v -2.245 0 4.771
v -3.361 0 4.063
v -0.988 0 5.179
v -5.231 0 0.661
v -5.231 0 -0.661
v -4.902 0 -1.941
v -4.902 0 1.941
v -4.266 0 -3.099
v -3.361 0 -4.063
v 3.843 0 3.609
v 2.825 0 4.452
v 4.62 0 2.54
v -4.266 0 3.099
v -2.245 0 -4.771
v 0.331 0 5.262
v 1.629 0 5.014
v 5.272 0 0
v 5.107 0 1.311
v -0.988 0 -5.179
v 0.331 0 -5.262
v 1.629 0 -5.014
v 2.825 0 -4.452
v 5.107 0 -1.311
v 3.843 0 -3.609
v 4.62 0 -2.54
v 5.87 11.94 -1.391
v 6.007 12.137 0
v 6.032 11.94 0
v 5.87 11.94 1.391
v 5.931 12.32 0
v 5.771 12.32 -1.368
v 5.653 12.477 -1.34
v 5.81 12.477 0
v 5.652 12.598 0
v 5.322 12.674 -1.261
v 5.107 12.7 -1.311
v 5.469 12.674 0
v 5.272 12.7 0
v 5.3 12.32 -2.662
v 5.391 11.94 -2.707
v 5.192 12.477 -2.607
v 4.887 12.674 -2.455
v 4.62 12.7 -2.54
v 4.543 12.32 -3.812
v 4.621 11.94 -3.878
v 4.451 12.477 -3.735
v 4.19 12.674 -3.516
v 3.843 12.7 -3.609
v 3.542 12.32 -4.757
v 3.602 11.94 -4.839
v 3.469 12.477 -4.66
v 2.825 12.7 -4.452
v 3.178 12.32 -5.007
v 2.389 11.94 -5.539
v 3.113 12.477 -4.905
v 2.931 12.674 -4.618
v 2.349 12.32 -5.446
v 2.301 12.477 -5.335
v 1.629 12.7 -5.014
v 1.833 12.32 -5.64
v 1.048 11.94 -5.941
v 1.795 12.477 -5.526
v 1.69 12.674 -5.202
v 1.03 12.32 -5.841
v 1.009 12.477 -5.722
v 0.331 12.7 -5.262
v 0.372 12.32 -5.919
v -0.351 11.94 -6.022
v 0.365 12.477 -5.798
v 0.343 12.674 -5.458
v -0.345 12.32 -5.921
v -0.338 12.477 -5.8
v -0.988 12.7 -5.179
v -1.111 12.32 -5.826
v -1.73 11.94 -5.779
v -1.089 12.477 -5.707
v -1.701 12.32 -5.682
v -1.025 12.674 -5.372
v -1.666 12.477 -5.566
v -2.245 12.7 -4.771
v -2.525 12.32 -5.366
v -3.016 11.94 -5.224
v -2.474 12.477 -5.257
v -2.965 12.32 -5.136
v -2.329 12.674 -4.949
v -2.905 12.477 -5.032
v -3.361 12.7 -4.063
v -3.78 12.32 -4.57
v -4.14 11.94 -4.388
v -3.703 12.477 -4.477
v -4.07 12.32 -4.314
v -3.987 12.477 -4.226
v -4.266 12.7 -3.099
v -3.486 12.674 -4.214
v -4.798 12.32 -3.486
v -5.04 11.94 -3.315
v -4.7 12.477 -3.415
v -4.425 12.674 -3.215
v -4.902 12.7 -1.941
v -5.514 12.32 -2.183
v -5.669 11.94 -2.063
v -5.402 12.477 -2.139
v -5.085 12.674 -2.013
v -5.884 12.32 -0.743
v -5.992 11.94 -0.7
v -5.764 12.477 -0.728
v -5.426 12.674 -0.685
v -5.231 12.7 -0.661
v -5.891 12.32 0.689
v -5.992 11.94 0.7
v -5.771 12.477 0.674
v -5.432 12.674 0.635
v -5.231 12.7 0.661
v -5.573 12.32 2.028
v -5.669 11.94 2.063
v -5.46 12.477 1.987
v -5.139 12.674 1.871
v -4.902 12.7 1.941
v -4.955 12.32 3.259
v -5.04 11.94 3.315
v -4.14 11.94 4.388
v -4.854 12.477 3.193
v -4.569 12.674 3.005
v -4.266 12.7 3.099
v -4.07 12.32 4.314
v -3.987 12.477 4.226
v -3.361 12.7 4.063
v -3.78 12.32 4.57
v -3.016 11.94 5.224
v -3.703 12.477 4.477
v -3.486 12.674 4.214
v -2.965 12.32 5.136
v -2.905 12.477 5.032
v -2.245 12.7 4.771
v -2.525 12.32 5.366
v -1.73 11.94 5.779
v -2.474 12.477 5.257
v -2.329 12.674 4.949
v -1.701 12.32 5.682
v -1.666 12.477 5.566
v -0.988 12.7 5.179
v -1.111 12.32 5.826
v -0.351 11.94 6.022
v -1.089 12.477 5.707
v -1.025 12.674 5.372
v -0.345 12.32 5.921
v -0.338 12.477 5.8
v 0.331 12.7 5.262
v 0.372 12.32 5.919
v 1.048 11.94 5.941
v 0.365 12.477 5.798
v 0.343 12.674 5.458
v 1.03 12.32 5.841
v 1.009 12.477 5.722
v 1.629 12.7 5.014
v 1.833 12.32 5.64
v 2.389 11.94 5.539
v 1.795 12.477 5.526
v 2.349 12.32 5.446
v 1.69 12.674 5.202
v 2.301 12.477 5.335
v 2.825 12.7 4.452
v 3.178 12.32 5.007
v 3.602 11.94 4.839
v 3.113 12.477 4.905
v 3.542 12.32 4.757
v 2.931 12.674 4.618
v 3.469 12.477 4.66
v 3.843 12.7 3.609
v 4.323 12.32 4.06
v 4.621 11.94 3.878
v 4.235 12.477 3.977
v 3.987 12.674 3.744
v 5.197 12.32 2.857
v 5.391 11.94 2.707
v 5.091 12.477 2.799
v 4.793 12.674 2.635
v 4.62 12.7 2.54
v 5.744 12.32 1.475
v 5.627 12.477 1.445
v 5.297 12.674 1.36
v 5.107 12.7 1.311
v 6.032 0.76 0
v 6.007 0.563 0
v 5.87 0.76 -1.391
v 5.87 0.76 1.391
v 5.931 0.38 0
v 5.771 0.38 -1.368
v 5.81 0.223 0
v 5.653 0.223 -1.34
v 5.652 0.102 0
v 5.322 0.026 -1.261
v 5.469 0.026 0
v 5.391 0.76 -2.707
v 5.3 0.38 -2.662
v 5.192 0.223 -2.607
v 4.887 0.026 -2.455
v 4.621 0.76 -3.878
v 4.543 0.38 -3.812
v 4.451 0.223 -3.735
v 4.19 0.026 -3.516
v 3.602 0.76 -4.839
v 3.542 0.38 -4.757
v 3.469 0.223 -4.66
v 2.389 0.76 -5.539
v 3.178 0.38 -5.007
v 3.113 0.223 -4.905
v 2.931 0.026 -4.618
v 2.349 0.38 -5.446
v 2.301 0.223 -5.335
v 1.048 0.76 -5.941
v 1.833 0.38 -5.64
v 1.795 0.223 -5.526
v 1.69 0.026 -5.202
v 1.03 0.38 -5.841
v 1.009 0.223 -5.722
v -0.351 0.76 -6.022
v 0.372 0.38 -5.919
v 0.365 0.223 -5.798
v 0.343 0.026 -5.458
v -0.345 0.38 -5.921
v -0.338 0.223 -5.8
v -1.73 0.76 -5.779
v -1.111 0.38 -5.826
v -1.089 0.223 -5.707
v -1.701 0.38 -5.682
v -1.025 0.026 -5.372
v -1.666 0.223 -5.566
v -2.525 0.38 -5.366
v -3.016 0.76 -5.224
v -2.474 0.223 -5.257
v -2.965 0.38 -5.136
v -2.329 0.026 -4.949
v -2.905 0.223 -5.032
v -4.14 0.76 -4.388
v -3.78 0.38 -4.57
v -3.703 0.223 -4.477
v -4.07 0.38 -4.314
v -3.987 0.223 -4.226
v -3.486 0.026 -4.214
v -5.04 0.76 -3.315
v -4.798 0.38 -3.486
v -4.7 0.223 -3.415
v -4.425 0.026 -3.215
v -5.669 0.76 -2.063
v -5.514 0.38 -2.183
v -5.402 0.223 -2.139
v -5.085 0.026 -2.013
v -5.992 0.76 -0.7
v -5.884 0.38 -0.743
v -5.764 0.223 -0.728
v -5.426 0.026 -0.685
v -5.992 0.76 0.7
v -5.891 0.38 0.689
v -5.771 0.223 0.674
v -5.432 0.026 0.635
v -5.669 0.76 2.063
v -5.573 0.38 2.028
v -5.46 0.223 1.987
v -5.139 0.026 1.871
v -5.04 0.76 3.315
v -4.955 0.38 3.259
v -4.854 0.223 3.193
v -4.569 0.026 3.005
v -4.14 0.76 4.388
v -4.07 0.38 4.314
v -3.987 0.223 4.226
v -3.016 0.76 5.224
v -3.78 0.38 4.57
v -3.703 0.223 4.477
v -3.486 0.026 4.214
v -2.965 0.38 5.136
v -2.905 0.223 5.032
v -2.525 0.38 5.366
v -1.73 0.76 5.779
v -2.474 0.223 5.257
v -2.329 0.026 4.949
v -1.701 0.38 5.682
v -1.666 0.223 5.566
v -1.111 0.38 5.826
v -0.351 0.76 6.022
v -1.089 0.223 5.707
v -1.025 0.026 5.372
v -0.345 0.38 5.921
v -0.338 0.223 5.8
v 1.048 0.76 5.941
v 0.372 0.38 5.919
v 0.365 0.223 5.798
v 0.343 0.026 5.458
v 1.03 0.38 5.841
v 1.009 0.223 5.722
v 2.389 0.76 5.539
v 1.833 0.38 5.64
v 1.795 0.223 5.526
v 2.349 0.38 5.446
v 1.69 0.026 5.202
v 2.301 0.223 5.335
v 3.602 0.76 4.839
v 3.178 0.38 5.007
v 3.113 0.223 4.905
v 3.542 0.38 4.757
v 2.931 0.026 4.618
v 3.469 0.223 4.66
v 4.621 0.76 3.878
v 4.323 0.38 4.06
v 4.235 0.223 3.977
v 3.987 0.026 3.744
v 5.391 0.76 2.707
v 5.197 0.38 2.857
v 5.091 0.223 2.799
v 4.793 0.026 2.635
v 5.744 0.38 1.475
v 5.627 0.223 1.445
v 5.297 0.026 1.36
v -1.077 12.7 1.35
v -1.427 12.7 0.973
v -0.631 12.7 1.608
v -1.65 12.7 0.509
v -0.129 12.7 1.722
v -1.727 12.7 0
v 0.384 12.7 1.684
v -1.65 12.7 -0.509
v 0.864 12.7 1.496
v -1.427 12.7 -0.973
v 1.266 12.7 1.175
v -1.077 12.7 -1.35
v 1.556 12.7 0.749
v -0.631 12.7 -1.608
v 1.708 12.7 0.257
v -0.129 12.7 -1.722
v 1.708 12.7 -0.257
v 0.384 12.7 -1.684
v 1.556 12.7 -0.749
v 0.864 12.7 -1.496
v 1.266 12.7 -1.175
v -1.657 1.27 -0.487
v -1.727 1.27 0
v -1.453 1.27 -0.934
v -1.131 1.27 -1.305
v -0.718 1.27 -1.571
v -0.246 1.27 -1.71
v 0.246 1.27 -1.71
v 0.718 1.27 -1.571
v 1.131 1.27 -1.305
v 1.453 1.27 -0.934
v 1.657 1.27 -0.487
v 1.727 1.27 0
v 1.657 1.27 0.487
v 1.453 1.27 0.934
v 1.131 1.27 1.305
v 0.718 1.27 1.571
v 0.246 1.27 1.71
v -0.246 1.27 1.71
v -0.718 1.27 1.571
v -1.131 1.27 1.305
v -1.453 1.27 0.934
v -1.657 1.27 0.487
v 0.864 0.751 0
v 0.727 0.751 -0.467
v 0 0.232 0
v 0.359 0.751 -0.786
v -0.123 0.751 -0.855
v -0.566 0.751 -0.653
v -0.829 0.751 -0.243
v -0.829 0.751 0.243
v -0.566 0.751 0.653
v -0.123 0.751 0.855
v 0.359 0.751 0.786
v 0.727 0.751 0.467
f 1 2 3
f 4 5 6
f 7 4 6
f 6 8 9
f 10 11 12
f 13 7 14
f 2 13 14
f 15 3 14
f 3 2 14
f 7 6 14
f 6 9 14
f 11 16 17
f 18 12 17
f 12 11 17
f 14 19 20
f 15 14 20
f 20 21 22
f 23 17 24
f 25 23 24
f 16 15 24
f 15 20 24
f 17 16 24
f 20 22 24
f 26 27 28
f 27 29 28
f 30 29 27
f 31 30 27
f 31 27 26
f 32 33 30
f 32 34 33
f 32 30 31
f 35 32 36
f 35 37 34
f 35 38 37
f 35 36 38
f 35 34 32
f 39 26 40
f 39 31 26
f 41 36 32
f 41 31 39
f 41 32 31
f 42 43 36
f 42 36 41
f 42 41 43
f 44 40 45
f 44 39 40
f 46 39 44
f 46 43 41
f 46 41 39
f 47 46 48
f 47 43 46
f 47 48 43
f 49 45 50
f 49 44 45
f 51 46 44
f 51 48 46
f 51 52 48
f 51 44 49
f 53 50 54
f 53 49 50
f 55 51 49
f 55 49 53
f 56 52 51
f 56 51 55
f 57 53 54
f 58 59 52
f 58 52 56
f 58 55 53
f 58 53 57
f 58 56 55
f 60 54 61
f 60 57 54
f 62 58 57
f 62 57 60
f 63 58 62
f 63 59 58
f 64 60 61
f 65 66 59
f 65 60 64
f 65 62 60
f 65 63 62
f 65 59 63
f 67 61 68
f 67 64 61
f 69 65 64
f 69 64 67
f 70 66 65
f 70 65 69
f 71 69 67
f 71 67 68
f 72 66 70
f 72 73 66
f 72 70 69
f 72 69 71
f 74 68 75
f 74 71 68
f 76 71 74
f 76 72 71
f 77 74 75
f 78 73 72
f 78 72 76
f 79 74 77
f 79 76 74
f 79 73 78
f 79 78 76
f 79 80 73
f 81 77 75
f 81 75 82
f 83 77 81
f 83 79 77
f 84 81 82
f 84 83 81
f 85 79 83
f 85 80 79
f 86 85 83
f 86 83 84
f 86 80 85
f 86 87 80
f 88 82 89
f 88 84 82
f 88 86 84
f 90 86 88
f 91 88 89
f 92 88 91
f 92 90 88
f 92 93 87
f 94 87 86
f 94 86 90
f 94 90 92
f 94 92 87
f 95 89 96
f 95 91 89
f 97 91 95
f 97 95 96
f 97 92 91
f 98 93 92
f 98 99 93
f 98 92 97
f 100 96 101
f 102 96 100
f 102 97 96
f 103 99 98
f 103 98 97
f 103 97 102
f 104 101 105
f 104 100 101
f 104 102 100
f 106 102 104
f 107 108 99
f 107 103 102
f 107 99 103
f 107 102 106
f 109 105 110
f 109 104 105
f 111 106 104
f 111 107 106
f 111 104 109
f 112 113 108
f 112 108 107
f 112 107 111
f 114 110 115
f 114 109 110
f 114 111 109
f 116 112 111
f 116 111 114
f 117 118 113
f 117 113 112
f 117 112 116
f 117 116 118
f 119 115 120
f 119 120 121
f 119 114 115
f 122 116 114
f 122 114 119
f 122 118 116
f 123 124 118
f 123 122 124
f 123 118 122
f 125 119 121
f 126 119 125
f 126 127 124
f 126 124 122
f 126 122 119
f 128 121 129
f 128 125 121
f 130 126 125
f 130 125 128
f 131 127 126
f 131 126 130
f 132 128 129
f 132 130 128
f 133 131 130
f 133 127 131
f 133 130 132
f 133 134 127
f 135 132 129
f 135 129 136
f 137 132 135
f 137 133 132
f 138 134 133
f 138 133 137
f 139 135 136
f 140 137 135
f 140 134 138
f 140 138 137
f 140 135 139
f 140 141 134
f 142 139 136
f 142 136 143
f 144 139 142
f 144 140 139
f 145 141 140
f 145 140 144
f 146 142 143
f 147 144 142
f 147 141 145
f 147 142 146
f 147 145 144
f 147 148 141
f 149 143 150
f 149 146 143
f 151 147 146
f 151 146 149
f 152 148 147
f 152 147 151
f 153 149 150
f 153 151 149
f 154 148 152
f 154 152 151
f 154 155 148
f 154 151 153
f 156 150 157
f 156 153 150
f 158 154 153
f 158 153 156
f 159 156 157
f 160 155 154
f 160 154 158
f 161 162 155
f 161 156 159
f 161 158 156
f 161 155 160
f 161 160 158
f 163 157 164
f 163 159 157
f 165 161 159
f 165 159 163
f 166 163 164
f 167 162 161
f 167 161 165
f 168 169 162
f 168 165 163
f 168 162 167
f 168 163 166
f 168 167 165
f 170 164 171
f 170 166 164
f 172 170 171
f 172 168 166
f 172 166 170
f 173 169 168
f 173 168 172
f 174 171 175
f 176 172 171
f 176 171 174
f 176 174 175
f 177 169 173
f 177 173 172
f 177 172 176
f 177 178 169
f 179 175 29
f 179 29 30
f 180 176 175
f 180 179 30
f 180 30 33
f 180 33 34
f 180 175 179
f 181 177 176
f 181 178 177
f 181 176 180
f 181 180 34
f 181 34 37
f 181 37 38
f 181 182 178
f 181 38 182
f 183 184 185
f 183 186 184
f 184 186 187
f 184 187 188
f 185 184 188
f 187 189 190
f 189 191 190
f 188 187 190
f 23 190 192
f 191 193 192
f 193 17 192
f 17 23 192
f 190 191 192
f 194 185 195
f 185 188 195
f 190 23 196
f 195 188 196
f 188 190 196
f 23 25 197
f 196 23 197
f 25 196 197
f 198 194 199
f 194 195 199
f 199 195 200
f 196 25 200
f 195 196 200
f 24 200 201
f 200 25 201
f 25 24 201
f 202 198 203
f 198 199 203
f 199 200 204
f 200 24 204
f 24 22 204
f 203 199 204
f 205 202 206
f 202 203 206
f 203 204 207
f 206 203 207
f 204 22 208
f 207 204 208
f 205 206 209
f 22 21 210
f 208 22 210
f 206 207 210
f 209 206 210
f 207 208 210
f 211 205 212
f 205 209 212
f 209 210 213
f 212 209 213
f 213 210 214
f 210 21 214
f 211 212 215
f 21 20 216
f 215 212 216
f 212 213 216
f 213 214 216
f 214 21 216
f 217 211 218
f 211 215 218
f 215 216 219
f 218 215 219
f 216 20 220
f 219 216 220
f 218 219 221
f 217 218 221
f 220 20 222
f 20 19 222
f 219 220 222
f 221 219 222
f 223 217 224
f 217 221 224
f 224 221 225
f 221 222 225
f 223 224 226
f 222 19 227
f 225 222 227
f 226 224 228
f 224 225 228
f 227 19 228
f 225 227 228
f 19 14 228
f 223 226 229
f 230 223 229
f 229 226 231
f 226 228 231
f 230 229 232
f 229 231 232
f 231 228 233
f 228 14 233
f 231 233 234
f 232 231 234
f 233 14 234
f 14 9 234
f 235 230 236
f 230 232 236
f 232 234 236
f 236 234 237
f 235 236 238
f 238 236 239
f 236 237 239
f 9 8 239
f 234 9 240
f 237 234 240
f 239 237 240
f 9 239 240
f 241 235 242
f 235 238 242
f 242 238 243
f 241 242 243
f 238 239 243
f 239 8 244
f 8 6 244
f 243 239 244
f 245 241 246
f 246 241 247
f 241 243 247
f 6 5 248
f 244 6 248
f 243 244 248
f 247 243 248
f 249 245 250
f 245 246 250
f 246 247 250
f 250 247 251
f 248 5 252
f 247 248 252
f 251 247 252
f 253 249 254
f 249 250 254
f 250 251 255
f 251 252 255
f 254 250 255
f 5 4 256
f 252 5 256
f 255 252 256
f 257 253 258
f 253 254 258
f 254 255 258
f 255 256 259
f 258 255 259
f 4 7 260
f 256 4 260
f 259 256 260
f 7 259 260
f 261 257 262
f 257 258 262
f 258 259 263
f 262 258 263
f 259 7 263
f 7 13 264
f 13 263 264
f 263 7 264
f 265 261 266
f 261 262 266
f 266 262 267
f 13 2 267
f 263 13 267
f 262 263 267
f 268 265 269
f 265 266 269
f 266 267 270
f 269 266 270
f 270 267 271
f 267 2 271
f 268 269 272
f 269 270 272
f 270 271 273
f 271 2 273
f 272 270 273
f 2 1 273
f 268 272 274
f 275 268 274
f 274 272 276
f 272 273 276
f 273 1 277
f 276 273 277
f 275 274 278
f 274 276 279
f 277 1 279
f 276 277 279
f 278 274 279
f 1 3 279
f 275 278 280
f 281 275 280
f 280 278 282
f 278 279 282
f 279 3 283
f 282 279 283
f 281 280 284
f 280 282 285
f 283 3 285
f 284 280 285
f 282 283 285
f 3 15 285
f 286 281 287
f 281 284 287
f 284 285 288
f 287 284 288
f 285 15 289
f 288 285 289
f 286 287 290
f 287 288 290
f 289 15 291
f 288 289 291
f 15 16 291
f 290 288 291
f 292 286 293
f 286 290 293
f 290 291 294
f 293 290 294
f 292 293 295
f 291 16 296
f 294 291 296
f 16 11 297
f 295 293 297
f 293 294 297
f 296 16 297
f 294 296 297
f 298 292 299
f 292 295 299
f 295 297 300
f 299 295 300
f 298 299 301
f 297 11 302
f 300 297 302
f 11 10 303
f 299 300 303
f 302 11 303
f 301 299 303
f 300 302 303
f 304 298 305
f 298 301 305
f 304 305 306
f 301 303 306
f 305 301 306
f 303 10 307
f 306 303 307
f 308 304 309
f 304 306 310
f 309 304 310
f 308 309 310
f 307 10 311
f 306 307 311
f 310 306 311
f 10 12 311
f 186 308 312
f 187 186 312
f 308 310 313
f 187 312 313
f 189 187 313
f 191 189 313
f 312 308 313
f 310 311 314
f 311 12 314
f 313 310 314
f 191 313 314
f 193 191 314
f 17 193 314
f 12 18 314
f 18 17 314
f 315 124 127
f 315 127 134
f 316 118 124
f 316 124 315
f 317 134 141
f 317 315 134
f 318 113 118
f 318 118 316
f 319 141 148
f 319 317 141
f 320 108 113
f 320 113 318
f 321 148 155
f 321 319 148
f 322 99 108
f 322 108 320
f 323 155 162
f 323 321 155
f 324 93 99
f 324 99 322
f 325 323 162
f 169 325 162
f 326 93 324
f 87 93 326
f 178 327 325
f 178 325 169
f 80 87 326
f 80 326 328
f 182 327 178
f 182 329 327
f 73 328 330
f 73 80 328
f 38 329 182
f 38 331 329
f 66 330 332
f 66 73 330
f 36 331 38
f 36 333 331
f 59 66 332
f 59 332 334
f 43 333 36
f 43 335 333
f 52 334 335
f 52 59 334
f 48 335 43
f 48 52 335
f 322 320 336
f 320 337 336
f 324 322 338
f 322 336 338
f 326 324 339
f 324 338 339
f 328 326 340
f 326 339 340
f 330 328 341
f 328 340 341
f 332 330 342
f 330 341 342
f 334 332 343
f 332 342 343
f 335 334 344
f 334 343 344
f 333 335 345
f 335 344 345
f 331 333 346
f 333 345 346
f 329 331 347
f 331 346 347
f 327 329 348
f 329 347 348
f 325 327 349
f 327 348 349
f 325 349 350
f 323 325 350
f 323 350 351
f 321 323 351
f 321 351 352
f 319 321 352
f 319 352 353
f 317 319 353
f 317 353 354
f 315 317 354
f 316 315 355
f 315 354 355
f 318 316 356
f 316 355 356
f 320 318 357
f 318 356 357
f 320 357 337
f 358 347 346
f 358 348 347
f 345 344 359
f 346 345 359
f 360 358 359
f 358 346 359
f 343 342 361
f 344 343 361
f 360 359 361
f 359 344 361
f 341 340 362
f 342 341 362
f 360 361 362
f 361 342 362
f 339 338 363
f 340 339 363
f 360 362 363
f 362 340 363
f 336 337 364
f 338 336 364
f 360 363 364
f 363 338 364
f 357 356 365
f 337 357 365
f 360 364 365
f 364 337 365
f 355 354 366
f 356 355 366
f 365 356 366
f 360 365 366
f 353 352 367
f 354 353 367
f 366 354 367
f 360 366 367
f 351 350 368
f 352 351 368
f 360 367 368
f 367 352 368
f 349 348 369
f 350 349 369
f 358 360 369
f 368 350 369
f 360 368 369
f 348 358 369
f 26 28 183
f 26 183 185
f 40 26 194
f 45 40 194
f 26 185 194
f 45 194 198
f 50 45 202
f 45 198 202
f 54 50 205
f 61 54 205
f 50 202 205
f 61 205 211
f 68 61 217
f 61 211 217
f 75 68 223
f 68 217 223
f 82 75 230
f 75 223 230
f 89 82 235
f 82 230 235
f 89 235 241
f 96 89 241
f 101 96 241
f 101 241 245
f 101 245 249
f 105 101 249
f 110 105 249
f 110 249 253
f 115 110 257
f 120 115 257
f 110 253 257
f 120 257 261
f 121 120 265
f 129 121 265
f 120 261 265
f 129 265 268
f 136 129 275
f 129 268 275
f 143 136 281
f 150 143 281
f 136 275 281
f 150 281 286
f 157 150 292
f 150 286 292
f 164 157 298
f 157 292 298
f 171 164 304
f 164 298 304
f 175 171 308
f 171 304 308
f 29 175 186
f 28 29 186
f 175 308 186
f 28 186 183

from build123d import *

# Parameters (mm, degrees)
SKETCH1_R                 = 6.0325
BOSS_EXTRUDE1_DEPTH       = 12.7
FILLET1_R                 = 0.76
F_8_32_TAPPED_HOLE1_D     = 3.4544
F_8_32_TAPPED_HOLE1_DEPTH = 11.43
F_8_32_TAPPED_HOLE1_TIP   = 1.037806461


with BuildPart() as part:
    # Sketch1 → Boss-Extrude1 (new body)
    with BuildSketch(Plane(origin=(0, 0, 0), x_dir=(1, 0, 0), z_dir=(0, 1, 0))):
        Circle(SKETCH1_R)
    extrude(amount=BOSS_EXTRUDE1_DEPTH)

    # Fillet1
    fillet1_edges = [part.edges().sort_by_distance(p)[0] for p in [
        (-6.0325, 0, 0),
        (-6.0325, 12.7, 0),
    ]]
    fillet(fillet1_edges, radius=FILLET1_R)

    # #8-32 Tapped Hole1
    with Locations(Plane(origin=(0, 12.7, 0), x_dir=(1, 0, 0), z_dir=(0, 1, 0))):
        with Locations((0, 0)):
            Hole(F_8_32_TAPPED_HOLE1_D / 2, depth=F_8_32_TAPPED_HOLE1_DEPTH)
            with Locations((0, 0, -(F_8_32_TAPPED_HOLE1_DEPTH + F_8_32_TAPPED_HOLE1_TIP / 2))):  # 118° drill point
                Cone(0, F_8_32_TAPPED_HOLE1_D / 2, F_8_32_TAPPED_HOLE1_TIP, mode=Mode.SUBTRACT)


solid = part.part
